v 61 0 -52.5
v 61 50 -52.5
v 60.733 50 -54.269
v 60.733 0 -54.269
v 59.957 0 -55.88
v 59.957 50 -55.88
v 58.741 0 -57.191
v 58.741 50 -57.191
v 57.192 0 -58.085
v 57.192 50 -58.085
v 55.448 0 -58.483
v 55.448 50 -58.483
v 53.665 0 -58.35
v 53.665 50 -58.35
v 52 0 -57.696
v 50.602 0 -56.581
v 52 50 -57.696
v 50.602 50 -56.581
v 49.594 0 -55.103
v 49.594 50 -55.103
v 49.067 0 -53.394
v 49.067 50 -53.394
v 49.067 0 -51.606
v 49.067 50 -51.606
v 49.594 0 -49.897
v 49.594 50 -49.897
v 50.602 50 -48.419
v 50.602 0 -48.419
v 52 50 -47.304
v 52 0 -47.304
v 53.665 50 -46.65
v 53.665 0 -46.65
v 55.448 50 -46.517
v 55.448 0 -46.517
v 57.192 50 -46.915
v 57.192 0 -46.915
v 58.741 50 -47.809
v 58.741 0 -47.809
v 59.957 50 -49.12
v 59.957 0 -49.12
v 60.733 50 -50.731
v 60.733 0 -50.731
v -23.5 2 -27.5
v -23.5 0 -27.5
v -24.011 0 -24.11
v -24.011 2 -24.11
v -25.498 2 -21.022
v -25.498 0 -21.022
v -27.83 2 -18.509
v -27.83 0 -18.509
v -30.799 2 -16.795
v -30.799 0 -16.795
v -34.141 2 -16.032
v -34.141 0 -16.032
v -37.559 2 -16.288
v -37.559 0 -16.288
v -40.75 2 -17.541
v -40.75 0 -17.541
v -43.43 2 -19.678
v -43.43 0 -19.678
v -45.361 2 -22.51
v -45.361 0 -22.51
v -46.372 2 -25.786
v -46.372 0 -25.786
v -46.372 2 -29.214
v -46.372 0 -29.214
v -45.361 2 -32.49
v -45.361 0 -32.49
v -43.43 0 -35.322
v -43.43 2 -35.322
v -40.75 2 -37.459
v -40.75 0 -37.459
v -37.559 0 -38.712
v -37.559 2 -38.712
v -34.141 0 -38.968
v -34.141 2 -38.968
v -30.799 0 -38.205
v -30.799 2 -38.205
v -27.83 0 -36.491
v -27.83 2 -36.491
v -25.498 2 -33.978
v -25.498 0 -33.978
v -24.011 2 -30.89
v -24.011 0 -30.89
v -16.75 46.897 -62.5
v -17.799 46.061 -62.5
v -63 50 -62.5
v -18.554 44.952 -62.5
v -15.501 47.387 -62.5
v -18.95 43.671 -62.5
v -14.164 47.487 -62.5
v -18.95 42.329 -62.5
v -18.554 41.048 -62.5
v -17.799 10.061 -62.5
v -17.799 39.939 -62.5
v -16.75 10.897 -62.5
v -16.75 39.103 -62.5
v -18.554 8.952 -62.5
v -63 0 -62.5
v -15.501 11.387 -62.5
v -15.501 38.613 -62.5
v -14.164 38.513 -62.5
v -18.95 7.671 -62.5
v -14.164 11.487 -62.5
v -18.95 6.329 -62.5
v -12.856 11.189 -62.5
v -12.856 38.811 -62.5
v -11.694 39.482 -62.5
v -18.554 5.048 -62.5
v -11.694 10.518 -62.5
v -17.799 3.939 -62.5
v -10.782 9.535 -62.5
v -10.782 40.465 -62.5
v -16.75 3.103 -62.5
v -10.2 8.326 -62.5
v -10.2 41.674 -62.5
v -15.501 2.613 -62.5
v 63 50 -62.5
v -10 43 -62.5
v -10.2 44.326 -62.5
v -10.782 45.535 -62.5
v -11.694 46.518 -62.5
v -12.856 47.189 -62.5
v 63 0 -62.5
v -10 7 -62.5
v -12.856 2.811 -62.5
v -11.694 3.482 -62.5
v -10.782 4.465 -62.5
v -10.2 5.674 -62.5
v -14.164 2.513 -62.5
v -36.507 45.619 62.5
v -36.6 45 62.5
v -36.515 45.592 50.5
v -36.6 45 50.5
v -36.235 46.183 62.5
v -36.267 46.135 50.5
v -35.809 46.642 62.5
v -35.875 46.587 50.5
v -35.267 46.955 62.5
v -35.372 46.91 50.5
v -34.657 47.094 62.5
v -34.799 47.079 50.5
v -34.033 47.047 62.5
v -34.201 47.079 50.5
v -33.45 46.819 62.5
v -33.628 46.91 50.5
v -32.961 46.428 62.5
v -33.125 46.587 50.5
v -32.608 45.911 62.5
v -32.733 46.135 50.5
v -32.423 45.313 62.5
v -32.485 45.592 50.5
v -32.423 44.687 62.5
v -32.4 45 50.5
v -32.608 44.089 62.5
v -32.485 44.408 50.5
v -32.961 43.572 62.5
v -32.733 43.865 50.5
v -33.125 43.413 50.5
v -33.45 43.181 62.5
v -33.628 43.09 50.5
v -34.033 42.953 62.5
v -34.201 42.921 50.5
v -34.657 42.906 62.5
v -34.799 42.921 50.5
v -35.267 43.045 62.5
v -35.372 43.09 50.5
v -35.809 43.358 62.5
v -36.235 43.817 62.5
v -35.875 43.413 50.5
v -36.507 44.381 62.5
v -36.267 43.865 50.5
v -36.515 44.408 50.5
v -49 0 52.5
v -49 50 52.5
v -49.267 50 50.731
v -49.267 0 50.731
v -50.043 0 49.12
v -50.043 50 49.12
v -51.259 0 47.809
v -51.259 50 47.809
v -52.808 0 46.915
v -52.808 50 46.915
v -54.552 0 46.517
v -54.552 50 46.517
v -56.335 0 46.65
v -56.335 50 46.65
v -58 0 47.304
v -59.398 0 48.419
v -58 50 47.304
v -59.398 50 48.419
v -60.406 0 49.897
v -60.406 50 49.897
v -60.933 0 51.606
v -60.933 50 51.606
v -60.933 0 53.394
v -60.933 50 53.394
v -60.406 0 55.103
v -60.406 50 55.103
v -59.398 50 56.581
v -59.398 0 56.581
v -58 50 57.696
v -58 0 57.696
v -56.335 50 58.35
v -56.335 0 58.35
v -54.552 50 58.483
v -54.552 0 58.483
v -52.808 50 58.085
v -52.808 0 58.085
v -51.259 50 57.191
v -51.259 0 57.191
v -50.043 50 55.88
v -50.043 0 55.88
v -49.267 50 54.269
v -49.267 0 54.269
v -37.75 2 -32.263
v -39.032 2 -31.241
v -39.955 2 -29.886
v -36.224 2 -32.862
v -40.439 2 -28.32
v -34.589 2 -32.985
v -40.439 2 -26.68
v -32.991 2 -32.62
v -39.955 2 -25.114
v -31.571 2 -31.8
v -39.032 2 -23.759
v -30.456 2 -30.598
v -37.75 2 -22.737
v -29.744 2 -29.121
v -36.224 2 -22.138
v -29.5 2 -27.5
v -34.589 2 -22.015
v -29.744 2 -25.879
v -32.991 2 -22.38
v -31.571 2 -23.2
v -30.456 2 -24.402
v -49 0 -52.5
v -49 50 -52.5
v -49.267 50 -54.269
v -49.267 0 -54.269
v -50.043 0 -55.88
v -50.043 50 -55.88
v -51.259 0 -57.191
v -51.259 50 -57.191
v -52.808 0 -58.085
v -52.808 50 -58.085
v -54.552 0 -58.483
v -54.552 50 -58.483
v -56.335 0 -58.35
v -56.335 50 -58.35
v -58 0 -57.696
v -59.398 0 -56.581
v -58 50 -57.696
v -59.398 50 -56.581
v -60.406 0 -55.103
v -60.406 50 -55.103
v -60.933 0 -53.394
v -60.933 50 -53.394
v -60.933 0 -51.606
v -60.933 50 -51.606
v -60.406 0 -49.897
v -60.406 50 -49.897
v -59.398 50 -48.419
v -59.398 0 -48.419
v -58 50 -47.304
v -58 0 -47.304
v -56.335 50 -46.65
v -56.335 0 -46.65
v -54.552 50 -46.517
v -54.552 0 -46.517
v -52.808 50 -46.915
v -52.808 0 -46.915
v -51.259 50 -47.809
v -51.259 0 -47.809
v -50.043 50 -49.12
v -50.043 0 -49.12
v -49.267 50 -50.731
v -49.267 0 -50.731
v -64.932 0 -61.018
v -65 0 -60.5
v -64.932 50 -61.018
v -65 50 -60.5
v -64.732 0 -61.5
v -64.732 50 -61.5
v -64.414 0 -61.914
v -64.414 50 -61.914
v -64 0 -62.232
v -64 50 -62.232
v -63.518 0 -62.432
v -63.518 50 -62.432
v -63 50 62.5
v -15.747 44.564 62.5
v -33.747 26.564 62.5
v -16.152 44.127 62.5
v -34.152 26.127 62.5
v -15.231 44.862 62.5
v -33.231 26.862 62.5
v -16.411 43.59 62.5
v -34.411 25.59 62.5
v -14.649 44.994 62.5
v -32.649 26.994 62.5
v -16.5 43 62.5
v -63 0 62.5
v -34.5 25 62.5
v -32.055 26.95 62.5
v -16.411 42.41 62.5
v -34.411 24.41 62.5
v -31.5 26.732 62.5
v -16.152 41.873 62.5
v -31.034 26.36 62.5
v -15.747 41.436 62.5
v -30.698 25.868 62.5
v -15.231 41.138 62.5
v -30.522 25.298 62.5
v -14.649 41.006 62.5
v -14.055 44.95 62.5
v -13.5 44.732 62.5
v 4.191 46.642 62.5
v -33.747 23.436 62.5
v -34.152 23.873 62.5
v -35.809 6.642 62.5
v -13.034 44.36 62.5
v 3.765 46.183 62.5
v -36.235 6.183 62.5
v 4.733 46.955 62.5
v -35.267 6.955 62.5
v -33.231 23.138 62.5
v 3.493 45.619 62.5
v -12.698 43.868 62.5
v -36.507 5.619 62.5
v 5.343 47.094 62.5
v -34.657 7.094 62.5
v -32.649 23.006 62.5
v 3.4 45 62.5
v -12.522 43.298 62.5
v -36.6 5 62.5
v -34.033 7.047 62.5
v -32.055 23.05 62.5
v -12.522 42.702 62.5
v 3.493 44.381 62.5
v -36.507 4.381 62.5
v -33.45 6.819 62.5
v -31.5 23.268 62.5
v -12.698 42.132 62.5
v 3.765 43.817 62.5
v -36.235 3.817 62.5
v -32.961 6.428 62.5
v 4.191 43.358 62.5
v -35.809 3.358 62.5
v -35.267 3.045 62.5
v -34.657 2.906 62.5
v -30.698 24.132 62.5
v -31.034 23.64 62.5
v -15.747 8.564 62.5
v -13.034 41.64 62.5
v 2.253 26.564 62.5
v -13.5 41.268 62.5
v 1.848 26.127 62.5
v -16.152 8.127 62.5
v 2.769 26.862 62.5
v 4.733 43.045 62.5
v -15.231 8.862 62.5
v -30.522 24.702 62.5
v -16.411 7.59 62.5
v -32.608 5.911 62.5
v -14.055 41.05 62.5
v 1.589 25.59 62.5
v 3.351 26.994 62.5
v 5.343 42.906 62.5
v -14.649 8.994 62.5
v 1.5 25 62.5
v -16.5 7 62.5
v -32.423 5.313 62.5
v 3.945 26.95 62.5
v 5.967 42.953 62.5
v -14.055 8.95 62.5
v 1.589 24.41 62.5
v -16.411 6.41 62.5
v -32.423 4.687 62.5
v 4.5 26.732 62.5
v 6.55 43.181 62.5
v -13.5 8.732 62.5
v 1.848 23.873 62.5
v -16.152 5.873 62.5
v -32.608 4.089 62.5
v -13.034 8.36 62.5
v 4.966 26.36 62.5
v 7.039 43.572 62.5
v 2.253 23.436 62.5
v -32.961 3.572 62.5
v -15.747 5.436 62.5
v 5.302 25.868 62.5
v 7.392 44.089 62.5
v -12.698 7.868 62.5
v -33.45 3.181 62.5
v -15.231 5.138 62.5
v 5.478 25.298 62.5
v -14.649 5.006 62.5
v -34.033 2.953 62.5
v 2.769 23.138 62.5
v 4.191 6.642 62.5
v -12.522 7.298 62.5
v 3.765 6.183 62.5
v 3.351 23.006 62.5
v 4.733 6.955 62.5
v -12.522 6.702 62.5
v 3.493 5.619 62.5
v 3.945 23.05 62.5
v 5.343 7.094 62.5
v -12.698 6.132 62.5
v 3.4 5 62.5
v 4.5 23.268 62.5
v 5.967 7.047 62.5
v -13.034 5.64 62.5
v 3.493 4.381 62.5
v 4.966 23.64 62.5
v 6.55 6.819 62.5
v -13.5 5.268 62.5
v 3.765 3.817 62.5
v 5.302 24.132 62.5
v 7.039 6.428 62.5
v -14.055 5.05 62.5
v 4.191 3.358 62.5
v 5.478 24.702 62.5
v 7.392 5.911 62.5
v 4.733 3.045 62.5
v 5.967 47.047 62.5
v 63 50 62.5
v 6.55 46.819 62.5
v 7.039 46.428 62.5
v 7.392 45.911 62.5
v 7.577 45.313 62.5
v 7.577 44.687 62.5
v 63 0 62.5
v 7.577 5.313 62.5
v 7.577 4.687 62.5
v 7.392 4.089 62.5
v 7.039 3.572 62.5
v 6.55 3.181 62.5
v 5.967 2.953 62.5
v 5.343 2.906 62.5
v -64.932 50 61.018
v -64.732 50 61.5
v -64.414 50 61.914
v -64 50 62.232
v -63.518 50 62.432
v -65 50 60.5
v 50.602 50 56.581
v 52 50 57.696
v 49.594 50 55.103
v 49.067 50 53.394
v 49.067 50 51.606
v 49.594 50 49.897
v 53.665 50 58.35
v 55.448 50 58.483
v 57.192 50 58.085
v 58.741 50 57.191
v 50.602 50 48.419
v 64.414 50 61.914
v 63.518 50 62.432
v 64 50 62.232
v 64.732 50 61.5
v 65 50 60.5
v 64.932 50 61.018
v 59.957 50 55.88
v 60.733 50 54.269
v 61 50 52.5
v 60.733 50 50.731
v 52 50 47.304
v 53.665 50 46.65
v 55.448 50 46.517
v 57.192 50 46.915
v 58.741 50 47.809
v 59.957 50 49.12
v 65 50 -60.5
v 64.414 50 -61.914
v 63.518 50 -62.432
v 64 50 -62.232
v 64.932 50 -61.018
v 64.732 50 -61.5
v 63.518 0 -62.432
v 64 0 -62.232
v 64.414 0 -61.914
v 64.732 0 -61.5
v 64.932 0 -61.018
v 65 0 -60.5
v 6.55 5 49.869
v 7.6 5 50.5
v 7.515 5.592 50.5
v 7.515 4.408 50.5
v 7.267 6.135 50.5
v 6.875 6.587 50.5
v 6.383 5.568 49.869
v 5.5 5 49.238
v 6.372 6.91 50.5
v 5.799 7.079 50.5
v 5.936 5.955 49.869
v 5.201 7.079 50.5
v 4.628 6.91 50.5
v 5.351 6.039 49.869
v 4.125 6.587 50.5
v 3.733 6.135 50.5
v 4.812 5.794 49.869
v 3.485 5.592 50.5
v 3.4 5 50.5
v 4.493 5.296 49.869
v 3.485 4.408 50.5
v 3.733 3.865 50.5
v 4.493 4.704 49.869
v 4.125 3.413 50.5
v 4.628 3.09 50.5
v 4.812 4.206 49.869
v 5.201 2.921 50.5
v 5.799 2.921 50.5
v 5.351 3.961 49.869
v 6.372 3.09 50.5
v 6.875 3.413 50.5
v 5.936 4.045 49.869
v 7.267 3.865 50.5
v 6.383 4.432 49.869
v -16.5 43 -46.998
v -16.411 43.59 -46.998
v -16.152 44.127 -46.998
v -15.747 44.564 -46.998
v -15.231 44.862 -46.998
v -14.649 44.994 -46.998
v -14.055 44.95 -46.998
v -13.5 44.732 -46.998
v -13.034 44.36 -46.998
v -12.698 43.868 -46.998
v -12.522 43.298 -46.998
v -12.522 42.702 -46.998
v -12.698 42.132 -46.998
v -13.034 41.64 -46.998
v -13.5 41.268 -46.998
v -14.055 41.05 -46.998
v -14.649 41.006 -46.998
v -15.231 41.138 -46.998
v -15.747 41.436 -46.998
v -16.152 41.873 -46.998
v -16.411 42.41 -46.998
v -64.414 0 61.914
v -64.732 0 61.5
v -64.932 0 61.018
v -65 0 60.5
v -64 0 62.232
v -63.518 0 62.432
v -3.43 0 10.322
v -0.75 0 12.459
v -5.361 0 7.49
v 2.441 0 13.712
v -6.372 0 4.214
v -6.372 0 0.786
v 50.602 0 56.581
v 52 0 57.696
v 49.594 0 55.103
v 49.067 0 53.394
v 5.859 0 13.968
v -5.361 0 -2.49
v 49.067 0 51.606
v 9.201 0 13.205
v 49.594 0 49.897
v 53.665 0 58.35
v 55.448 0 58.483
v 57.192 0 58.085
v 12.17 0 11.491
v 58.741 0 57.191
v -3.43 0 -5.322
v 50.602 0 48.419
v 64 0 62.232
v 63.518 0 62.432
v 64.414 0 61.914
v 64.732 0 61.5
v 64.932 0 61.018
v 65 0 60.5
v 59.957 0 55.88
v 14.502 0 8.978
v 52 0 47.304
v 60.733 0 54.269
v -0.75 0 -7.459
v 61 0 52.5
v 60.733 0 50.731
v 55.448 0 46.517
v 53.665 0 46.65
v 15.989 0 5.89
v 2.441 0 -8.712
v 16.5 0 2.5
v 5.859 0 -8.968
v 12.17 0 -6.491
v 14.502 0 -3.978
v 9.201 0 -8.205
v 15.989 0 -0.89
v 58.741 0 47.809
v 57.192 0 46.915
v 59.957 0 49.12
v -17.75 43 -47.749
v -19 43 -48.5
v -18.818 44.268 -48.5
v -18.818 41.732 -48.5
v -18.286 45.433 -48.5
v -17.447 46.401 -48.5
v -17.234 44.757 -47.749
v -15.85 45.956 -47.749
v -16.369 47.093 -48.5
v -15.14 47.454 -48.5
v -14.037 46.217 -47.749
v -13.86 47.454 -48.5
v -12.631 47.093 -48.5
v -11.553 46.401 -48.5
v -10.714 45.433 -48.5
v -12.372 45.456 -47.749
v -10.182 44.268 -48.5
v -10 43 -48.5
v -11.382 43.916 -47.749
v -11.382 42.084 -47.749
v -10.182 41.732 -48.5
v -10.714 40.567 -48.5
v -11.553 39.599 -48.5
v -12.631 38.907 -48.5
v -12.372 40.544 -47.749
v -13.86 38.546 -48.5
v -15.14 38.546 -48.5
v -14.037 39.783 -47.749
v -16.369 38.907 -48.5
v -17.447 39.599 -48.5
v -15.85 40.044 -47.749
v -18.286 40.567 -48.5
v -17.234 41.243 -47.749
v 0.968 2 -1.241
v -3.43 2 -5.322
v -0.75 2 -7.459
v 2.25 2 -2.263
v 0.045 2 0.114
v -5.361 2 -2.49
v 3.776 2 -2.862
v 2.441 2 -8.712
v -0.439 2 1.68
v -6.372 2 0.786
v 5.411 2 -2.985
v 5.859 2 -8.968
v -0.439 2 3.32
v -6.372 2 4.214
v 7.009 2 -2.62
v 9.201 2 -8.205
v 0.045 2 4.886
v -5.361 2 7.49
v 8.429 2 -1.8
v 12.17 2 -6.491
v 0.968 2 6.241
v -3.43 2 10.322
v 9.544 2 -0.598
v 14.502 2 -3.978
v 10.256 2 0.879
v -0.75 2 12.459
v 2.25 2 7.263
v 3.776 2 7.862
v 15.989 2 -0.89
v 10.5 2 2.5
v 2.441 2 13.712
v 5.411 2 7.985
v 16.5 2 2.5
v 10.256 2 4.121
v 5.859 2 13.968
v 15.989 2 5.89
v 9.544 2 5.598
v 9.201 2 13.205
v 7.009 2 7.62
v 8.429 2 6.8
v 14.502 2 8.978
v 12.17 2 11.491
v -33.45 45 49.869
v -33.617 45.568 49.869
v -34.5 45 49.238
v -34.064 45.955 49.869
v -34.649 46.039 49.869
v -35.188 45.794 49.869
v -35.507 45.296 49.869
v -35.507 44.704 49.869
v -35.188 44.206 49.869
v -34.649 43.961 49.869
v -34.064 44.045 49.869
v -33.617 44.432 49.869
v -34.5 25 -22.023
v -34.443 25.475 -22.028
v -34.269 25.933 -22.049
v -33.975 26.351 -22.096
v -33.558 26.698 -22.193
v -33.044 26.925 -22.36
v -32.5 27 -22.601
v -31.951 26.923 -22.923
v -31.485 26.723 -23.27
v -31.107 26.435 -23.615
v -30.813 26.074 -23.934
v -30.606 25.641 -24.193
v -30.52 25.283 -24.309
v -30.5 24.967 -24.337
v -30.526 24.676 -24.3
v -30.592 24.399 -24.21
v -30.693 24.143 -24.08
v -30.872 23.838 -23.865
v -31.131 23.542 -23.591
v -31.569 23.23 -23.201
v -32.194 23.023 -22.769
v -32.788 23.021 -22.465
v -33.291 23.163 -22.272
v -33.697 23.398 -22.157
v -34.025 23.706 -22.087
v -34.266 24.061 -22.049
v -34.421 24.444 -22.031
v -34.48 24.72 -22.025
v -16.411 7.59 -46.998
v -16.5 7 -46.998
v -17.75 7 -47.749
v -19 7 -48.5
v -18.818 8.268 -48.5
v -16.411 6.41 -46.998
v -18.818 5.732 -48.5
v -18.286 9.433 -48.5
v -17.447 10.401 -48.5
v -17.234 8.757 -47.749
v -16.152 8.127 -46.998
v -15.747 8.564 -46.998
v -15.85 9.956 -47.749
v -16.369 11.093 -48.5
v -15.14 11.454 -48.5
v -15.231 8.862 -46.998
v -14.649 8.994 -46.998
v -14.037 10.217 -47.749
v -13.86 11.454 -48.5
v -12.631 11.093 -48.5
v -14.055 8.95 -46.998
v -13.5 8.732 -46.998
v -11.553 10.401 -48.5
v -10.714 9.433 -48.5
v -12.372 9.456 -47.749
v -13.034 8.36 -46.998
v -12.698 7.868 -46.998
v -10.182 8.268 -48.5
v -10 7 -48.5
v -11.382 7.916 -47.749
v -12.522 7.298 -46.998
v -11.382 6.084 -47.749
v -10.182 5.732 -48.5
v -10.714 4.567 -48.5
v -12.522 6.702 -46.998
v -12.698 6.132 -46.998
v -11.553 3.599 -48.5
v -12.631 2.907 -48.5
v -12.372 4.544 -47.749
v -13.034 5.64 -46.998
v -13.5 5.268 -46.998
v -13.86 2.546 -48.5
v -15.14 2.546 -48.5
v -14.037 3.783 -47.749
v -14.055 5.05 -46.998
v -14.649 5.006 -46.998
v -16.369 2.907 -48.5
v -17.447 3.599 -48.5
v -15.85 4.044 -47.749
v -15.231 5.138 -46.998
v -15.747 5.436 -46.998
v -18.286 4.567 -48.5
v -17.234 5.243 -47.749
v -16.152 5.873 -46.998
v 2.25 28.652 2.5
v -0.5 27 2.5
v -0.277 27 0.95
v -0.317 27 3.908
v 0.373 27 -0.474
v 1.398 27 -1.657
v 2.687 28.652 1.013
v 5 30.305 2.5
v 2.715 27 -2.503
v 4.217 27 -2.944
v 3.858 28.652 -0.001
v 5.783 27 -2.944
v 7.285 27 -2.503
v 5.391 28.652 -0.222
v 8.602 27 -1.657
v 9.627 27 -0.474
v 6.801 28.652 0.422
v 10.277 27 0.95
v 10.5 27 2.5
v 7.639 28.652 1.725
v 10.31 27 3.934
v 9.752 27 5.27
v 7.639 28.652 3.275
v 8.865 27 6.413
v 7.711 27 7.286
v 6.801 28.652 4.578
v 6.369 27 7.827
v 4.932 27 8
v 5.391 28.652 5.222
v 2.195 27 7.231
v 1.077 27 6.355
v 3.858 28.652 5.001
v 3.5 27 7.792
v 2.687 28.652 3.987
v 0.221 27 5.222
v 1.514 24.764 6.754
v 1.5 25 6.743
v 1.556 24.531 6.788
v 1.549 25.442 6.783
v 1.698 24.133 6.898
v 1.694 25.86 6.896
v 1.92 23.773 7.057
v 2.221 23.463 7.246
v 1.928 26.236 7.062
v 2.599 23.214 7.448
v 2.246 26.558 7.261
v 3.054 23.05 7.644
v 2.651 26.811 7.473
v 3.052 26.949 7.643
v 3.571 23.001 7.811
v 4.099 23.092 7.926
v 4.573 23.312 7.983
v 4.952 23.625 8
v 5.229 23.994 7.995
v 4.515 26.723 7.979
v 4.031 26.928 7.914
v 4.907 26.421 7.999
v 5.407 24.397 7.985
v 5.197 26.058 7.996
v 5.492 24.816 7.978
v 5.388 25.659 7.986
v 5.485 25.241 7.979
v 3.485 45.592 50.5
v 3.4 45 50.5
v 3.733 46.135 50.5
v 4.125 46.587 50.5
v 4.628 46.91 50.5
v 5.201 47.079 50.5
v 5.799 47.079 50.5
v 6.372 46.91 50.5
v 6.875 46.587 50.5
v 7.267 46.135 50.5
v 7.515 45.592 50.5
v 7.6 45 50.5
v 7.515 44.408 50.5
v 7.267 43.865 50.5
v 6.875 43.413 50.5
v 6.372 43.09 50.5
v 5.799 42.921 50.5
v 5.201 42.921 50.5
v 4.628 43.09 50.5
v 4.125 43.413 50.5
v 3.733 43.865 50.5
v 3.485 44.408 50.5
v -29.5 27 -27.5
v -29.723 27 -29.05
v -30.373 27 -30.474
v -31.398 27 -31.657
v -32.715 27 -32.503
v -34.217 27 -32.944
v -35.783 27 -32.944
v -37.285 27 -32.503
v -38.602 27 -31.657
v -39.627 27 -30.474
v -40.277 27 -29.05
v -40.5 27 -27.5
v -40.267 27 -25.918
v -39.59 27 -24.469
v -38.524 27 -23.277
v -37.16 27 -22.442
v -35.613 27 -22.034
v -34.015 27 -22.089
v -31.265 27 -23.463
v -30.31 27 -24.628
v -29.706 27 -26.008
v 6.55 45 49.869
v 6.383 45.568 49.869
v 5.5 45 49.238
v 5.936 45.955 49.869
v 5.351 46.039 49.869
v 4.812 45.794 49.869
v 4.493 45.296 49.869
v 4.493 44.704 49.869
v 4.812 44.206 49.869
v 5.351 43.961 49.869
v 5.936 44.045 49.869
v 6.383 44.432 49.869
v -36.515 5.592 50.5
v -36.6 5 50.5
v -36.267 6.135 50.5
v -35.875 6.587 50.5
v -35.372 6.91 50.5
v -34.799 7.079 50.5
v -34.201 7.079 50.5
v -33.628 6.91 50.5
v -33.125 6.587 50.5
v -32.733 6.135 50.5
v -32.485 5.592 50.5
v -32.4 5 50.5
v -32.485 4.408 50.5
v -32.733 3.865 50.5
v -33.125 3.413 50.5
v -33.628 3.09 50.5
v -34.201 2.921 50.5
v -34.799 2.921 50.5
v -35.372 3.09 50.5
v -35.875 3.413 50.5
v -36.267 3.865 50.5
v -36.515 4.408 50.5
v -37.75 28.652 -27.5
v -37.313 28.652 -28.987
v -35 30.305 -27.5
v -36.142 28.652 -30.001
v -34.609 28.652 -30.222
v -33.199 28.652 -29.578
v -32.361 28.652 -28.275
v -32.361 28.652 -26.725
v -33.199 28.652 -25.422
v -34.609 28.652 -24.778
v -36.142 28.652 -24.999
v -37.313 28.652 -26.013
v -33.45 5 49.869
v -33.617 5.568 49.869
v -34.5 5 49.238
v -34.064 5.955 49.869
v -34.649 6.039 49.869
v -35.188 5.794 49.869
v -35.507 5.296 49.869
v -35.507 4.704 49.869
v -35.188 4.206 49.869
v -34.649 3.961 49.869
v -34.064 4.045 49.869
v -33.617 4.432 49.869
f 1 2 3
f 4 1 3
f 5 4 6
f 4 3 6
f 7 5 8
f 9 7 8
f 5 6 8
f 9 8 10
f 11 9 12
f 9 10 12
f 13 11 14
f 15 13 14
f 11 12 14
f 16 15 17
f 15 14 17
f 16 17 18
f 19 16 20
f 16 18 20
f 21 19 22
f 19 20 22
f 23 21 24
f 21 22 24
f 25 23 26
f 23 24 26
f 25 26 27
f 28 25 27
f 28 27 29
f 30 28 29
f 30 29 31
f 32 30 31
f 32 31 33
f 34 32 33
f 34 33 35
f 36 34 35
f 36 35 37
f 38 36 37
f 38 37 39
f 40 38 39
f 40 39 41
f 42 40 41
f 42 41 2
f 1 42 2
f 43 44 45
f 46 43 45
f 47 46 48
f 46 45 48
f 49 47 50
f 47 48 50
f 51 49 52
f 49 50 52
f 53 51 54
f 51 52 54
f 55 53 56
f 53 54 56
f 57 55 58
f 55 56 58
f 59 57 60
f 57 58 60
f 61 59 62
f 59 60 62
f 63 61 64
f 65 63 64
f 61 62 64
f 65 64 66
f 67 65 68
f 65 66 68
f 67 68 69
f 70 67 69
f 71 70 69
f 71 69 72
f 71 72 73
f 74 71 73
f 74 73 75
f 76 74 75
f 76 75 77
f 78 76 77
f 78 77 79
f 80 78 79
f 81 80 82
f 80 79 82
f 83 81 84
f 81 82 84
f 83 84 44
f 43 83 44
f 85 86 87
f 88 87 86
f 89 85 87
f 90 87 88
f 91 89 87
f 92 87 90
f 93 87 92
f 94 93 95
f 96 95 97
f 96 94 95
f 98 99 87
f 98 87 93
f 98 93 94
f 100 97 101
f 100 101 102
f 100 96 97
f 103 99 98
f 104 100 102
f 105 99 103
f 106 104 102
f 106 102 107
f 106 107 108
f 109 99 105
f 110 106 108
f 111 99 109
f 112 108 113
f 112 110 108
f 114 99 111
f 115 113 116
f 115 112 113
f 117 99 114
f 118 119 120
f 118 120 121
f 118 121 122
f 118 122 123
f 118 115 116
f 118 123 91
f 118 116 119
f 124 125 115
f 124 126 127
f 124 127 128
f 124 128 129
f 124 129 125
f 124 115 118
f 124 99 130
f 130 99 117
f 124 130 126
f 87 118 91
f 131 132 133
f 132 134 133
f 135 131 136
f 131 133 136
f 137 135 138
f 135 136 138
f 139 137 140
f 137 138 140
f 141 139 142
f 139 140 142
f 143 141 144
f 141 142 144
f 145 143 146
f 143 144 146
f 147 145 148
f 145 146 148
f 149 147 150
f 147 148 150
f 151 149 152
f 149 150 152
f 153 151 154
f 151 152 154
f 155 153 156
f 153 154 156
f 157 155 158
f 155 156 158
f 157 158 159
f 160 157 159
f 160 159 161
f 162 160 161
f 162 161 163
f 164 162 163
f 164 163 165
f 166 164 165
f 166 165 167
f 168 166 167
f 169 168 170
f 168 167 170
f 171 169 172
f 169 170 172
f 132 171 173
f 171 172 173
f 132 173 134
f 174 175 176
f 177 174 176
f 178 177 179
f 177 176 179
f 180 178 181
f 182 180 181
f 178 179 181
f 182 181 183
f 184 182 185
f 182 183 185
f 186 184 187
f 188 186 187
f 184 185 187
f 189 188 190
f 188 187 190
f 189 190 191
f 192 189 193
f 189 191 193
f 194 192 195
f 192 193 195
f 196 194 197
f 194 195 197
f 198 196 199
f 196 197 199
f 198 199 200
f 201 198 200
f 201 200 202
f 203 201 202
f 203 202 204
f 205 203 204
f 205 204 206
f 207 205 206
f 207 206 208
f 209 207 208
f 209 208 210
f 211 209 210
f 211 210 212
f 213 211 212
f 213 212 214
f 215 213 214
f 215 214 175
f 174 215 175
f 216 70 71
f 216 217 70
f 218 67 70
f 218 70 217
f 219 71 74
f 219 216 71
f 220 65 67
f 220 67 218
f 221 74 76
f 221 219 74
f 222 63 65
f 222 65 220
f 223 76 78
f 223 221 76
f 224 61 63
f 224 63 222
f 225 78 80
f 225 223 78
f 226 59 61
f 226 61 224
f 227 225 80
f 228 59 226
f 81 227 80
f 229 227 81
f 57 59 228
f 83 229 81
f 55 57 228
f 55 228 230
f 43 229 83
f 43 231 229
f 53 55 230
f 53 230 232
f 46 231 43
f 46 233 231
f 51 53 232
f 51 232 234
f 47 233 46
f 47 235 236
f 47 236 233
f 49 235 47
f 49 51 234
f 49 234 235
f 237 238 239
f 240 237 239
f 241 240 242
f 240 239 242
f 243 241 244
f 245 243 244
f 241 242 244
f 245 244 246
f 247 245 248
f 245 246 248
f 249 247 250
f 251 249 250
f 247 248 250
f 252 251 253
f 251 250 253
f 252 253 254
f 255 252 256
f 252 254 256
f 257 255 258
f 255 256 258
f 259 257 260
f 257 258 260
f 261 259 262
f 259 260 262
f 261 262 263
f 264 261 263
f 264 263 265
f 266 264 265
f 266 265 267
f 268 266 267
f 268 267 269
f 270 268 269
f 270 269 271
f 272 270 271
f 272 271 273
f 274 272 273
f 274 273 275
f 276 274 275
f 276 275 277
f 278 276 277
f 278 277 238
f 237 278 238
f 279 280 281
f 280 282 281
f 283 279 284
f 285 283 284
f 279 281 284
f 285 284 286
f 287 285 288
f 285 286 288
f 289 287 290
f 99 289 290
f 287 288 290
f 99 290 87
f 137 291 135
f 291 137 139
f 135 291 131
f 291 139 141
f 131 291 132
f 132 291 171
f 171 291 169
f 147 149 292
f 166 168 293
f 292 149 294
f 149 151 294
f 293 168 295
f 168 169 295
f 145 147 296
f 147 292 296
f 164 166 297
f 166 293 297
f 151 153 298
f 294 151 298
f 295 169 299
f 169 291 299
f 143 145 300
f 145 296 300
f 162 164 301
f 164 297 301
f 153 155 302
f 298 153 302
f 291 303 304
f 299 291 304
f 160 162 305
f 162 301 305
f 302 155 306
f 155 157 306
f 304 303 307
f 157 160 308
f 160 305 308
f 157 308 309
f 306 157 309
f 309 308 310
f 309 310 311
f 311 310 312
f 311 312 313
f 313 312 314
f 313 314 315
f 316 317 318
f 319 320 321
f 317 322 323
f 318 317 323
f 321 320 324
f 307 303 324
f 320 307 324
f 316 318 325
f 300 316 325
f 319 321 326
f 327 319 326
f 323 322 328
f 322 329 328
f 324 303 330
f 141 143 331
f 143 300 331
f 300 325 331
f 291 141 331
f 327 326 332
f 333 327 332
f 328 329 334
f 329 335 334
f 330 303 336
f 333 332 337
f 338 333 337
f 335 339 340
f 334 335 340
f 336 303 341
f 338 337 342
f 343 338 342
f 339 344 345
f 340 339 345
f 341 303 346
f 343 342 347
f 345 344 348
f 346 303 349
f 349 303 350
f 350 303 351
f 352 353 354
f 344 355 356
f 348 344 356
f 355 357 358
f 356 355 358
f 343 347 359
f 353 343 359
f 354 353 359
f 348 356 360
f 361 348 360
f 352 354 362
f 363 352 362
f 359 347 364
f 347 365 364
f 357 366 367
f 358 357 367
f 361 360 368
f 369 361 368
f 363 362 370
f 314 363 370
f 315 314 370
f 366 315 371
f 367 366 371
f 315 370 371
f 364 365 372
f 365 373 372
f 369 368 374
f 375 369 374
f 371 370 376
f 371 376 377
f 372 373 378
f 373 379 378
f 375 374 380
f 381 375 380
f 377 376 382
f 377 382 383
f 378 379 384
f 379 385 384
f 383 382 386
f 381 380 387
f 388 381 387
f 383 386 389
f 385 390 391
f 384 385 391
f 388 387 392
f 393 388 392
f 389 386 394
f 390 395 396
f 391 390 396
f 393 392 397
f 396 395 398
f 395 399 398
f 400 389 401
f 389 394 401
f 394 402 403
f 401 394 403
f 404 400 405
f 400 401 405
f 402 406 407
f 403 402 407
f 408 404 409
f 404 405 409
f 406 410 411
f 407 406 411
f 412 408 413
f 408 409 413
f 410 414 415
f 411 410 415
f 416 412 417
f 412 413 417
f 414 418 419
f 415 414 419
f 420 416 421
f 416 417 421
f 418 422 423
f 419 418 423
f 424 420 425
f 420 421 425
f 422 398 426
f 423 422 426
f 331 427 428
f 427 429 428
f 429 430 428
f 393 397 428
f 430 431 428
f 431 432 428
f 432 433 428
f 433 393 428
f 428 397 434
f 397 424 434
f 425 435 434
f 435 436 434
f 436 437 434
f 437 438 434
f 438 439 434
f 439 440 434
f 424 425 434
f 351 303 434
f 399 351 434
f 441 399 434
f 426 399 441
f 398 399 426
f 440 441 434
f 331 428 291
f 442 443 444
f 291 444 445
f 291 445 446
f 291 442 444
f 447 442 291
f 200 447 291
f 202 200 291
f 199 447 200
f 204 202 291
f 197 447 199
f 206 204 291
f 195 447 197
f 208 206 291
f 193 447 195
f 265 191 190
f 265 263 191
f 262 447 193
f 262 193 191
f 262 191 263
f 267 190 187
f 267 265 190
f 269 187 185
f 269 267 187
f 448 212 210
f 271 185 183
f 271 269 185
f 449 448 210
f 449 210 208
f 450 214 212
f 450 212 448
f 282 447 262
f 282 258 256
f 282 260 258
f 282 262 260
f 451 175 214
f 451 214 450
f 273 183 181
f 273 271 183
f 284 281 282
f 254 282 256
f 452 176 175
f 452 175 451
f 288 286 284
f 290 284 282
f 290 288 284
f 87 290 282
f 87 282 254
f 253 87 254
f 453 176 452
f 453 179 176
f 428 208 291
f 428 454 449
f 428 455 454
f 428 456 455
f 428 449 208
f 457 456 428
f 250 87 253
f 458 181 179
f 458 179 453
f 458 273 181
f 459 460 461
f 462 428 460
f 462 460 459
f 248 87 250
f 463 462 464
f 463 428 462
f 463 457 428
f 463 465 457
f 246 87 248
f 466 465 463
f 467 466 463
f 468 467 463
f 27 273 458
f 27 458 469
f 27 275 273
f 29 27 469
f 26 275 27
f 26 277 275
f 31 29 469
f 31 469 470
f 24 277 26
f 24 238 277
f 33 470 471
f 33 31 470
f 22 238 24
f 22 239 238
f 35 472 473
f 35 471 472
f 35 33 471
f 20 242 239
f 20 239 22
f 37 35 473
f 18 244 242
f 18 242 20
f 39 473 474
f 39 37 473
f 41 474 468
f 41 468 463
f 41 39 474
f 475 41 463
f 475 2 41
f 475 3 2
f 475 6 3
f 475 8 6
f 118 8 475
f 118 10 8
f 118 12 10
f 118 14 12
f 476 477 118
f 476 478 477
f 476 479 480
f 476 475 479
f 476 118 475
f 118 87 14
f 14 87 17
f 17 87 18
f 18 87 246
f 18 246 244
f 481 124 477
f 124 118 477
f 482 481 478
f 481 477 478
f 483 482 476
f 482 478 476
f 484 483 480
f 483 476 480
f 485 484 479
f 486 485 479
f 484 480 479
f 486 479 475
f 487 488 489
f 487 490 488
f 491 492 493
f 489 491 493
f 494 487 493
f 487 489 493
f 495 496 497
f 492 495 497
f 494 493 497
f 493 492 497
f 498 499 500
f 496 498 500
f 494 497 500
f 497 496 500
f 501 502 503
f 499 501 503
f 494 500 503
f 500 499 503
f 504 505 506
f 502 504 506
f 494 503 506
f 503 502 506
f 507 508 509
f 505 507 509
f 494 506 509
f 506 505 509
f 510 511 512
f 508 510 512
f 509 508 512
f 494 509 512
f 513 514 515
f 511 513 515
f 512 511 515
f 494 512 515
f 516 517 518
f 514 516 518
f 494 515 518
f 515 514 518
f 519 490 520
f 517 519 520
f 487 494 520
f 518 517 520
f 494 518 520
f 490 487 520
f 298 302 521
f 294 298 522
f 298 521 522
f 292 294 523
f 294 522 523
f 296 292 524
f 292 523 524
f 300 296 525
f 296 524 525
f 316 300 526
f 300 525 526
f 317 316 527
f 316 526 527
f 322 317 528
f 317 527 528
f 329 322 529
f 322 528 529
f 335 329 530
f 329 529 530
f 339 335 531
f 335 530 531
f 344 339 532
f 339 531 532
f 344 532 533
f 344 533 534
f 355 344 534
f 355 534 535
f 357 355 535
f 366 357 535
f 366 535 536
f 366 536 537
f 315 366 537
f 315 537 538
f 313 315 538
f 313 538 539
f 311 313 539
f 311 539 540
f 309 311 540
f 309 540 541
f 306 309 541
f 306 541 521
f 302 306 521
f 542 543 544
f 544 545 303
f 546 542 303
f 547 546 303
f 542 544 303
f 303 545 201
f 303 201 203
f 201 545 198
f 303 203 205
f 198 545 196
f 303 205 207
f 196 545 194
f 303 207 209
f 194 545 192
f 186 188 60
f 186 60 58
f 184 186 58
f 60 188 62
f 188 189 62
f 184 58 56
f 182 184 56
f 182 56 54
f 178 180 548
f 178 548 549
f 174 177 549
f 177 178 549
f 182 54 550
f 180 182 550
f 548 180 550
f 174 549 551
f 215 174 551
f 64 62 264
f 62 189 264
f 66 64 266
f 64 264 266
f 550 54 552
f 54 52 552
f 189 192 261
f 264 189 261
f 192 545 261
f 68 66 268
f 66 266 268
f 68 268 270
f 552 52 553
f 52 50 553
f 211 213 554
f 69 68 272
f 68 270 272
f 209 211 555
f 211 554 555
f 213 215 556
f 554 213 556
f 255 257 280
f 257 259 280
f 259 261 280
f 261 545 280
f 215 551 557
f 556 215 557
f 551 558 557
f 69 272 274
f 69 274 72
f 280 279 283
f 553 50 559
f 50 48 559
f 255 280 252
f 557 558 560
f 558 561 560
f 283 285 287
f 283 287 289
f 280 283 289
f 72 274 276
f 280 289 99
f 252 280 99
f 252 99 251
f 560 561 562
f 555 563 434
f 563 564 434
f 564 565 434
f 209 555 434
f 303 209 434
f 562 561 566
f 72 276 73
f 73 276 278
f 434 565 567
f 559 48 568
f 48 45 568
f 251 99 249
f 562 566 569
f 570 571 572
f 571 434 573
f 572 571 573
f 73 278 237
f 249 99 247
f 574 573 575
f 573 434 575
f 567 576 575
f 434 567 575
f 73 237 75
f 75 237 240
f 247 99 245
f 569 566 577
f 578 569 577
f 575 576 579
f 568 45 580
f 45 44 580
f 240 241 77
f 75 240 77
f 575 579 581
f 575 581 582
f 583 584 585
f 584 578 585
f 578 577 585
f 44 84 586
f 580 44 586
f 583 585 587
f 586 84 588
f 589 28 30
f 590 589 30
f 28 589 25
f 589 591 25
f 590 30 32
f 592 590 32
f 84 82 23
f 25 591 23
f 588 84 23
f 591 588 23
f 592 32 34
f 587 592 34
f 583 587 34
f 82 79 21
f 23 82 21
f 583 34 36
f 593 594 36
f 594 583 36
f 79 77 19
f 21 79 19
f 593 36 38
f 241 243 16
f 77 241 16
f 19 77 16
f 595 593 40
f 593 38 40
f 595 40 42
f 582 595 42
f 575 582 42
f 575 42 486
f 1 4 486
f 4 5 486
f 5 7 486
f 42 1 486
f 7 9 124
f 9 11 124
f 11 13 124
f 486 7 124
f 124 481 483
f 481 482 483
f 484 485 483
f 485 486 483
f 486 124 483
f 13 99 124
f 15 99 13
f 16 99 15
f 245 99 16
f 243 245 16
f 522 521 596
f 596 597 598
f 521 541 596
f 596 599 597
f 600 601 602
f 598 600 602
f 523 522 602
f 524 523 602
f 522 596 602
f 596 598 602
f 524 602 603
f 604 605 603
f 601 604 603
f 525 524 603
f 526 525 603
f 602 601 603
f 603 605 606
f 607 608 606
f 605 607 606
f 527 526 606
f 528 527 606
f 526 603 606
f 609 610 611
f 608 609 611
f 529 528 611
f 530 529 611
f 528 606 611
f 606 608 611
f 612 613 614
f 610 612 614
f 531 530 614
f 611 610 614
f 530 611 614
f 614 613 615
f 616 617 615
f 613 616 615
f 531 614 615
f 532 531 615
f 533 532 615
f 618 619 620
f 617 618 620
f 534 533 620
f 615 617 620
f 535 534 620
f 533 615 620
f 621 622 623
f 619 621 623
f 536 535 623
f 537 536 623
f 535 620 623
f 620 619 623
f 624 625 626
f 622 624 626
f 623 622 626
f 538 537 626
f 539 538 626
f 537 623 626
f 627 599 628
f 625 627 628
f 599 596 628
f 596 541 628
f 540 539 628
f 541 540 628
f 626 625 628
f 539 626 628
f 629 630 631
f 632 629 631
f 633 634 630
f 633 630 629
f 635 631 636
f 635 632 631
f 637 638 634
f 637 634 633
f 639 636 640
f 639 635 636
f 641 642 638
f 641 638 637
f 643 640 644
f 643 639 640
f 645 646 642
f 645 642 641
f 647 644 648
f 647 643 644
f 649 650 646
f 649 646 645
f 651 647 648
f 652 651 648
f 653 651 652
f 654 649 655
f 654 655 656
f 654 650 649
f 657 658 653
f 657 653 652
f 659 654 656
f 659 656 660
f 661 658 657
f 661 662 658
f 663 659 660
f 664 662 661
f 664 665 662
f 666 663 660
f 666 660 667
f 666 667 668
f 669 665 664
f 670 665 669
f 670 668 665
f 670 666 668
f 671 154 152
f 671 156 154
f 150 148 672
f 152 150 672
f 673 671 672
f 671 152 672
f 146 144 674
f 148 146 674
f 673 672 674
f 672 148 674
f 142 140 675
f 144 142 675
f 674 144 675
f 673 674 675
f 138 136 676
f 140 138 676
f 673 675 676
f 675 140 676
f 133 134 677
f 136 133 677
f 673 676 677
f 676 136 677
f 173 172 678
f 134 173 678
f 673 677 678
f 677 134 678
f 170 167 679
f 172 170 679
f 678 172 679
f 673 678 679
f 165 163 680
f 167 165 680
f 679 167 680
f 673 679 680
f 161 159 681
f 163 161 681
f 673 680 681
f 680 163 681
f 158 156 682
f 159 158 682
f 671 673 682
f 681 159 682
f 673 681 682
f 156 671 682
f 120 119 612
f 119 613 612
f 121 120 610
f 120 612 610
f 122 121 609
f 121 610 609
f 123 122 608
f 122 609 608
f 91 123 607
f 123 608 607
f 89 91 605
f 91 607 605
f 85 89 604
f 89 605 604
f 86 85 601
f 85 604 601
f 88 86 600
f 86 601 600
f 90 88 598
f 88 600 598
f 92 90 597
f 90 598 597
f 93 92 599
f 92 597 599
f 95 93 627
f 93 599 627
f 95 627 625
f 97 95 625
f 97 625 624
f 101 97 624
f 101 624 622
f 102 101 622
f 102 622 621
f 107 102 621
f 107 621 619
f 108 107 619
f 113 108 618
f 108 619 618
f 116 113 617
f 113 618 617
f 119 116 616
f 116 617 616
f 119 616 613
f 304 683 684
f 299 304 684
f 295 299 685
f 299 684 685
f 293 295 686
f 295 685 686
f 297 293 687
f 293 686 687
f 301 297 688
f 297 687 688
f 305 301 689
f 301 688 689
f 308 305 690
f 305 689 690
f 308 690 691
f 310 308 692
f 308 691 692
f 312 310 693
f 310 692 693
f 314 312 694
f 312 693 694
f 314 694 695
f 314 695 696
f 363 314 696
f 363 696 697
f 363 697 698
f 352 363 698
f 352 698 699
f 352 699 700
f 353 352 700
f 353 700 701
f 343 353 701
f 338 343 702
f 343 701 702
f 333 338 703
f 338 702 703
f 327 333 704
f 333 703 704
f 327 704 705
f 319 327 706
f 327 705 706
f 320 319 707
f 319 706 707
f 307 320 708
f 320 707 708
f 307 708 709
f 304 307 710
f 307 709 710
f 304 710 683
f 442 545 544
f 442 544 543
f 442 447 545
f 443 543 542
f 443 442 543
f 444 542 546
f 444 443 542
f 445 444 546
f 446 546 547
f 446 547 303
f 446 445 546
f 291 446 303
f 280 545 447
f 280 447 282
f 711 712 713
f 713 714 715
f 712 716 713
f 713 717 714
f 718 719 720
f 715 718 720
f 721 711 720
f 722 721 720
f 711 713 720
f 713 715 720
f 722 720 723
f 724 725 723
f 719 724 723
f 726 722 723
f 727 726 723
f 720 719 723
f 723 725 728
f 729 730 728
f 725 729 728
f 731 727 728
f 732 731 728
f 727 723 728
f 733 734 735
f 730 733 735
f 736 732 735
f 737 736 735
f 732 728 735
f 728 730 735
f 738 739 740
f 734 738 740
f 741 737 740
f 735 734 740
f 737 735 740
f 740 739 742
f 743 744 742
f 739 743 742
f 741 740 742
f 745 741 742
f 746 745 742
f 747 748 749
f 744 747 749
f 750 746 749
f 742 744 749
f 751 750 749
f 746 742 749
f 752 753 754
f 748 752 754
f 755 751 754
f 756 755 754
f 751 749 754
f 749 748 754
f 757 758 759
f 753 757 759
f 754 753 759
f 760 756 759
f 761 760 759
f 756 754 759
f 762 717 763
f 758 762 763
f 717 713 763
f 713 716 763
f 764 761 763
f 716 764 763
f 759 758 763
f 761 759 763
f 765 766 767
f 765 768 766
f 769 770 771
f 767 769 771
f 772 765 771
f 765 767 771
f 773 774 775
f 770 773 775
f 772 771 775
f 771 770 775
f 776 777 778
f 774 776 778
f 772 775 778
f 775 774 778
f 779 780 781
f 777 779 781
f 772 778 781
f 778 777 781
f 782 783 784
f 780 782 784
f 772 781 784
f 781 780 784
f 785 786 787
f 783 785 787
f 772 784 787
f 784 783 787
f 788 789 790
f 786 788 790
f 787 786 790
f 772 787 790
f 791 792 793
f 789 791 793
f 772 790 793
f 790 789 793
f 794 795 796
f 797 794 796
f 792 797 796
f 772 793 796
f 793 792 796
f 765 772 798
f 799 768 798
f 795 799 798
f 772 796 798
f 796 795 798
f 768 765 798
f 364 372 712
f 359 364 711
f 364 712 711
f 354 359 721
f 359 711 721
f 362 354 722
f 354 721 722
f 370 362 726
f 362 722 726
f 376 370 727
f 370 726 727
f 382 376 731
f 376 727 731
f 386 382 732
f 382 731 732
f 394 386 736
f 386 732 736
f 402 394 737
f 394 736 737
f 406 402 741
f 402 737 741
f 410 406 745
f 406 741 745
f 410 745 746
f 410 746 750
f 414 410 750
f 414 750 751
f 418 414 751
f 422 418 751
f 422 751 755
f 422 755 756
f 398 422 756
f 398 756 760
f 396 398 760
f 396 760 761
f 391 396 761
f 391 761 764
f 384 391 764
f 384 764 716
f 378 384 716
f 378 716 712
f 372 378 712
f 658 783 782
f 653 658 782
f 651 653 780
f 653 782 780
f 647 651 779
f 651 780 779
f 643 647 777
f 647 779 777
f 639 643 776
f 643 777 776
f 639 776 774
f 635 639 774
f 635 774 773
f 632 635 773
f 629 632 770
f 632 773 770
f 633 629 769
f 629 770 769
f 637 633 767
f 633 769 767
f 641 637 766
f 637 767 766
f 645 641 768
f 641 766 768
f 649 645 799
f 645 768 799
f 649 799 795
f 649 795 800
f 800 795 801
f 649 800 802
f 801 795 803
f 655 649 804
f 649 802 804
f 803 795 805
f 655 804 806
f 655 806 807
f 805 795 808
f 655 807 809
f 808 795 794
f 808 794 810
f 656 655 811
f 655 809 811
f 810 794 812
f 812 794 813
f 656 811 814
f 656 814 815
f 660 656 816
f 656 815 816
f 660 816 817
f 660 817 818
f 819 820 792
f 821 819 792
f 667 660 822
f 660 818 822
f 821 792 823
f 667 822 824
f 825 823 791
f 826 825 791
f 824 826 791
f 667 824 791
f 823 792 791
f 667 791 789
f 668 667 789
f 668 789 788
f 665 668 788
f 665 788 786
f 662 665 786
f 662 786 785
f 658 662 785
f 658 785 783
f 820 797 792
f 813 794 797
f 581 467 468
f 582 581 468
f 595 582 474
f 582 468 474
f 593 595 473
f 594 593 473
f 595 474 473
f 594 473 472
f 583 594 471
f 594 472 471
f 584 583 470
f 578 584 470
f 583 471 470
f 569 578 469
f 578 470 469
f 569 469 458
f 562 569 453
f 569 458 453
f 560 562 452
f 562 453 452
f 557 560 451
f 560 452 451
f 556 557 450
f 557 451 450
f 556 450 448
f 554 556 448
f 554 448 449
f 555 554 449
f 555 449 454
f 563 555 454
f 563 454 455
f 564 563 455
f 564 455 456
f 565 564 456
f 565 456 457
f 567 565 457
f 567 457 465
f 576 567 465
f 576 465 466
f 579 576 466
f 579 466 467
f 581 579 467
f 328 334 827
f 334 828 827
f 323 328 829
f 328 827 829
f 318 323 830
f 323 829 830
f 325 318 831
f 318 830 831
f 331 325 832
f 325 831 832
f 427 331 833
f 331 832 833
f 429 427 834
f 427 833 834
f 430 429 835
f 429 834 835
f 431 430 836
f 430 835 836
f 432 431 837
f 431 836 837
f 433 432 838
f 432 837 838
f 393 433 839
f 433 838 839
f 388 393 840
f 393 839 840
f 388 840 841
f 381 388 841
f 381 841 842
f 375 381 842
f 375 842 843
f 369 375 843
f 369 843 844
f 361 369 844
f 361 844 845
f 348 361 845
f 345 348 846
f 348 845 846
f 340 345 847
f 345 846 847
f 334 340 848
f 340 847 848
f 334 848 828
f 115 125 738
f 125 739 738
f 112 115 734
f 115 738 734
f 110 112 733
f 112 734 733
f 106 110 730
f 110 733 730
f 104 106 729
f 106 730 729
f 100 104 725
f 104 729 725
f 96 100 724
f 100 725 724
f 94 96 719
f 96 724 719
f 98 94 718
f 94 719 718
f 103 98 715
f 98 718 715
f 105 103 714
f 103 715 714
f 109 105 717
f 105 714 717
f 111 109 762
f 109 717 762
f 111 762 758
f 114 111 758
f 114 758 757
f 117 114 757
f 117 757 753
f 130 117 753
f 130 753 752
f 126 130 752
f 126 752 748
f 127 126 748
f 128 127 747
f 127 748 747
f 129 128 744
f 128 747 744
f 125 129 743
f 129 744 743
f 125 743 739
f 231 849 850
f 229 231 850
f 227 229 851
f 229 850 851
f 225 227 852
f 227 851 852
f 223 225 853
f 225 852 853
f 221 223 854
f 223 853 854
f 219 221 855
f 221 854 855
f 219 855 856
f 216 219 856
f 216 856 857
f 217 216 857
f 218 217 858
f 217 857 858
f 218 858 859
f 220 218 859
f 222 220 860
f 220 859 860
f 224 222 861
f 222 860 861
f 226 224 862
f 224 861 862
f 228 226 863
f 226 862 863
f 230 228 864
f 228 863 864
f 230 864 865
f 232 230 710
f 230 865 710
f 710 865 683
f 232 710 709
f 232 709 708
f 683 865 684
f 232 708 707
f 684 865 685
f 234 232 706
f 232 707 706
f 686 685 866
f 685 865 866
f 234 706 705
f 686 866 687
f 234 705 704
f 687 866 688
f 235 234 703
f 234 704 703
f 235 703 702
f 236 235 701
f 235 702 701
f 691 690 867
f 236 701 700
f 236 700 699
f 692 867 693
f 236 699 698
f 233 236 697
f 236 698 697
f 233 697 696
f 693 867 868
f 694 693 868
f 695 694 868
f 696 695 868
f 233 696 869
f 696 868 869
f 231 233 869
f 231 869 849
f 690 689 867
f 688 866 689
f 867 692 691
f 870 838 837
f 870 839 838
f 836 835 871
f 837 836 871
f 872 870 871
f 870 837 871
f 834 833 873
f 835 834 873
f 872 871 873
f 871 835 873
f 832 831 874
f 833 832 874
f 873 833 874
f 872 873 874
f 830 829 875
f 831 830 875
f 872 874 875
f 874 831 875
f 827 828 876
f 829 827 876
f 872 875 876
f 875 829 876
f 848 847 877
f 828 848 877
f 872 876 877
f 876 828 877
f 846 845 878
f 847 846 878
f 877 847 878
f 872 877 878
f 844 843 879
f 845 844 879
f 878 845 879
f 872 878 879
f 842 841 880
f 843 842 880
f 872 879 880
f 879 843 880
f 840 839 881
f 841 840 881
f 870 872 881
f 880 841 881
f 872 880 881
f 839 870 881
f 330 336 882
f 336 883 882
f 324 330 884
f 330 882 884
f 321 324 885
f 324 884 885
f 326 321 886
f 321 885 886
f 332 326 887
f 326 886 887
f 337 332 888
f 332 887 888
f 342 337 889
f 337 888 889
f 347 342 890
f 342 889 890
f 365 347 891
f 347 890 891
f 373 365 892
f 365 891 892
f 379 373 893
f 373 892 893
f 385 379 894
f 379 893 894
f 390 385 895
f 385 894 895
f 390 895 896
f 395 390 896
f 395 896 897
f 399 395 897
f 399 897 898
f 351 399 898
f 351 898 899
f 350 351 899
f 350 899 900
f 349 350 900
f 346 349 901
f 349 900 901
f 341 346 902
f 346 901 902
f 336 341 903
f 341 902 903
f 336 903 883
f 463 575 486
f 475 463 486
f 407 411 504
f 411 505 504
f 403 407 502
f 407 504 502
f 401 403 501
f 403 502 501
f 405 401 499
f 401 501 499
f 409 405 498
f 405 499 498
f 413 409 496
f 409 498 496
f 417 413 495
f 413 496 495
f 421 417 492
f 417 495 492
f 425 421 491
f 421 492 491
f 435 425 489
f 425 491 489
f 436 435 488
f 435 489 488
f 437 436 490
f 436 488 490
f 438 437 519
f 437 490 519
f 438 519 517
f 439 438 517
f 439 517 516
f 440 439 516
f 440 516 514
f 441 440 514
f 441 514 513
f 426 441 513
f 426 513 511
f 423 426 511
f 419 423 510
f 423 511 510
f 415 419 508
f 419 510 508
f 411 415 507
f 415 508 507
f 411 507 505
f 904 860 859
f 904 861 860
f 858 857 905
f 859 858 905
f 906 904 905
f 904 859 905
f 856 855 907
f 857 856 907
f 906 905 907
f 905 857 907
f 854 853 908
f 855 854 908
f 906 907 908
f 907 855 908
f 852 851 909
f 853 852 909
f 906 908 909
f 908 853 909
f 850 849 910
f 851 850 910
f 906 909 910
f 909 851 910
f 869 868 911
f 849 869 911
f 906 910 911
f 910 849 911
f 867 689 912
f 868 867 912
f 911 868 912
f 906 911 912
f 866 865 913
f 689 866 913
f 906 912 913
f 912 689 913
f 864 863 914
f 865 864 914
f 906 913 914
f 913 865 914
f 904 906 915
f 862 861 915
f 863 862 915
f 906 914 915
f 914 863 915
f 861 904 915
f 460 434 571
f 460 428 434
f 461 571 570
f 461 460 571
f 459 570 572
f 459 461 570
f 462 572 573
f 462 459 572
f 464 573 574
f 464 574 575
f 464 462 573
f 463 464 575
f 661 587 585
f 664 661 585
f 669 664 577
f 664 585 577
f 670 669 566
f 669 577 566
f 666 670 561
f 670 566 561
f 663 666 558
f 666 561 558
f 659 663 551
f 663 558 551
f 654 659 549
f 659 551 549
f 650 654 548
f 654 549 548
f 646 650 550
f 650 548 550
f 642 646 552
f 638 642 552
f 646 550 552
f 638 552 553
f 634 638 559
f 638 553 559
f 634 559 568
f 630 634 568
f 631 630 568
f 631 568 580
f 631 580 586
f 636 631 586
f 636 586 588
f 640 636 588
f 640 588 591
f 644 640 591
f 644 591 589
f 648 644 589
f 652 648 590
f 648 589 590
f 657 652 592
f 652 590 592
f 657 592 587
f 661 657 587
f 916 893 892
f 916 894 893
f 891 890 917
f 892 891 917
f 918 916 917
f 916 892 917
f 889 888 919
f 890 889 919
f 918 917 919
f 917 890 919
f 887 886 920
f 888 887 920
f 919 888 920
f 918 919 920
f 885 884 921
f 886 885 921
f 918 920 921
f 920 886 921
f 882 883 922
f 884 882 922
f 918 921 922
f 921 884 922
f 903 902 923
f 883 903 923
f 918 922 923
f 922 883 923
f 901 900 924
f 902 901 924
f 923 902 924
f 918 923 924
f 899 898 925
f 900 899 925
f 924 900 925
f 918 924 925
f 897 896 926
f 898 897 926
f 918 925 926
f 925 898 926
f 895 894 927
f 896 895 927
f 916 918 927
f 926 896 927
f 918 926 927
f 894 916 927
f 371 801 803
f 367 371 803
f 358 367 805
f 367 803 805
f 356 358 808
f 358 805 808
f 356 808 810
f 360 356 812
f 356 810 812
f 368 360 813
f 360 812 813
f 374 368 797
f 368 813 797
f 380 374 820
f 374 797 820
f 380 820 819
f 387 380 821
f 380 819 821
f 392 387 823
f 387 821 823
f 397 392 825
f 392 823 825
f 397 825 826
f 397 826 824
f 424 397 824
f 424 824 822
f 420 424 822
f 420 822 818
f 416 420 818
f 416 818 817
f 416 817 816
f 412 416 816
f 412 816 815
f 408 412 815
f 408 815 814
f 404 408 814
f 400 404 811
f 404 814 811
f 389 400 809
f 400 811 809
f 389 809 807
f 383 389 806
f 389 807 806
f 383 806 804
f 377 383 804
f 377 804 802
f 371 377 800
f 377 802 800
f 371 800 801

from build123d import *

# Parameters (mm, degrees)
SKETCH_1_W             = 130
SKETCH_1_H             = 125
EXTRUDE_1_DEPTH        = 50
SKETCH_2_R             = 6
CUT_EXTRUDE_1_DEPTH    = 51
FILLET_1_R             = 2
SKETCH_4_R             = 11.5
CUT_EXTRUDE_2_DEPTH    = 2
MM_4_D                 = 11
MM_4_DEPTH             = 25
MM_4_TIP               = 3.304733405
MM_4_2_D               = 11
MM_4_2_DEPTH           = 25
MM_4_2_TIP             = 3.304733405
HOLE_WIZARD_M5_1_D     = 4.2
HOLE_WIZARD_M5_1_DEPTH = 12
HOLE_WIZARD_M5_1_TIP   = 1.2618073
MM_3_D                 = 4
MM_3_DEPTH             = 56
MM_3_TIP               = 1.201721238
MM_4_3_D               = 4
MM_4_3_DEPTH           = 87
MM_4_3_TIP             = 1.201721238
MM_5_D                 = 4
M10X1_0_1_D            = 9
M10X1_0_1_DEPTH        = 14
M10X1_0_1_TIP          = 2.703872786


with BuildPart() as part:
    # 草图1 → 凸台-拉伸1 (new body)
    with BuildSketch(Plane(origin=(0, 0, 0), x_dir=(1, 0, 0), z_dir=(0, 1, 0))):
        Rectangle(SKETCH_1_W, SKETCH_1_H)
    extrude(amount=EXTRUDE_1_DEPTH)

    # 草图2 → 切除-拉伸1 (cut, through all)
    with BuildSketch(Plane(origin=(0, 50, 0), x_dir=(1, 0, 0), z_dir=(0, 1, 0))):
        with Locations((-55, 52.5)):
            Circle(SKETCH_2_R)
        with Locations((55, 52.5)):
            Circle(SKETCH_2_R)
        with Locations((55, -52.5)):
            Circle(SKETCH_2_R)
        with Locations((-55, -52.5)):
            Circle(SKETCH_2_R)
    extrude(amount=-CUT_EXTRUDE_1_DEPTH, mode=Mode.SUBTRACT)

    # 圆角1
    fillet_1_edges = [part.edges().sort_by_distance(p)[0] for p in [
        (65, 25, 62.5),
        (-65, 25, 62.5),
        (-65, 25, -62.5),
        (65, 25, -62.5),
    ]]
    fillet(fillet_1_edges, radius=FILLET_1_R)

    # 草图4 → 切除-拉伸2 (cut)
    with BuildSketch(Plane.XZ):
        with Locations((-35, -27.5)):
            Circle(SKETCH_4_R)
        with Locations((5, 2.5)):
            Circle(SKETCH_4_R)
    extrude(amount=-CUT_EXTRUDE_2_DEPTH, mode=Mode.SUBTRACT)

    # mm _4
    with Locations(Plane(origin=(0, 2, 0), x_dir=(-1, 0, 0), z_dir=(0, -1, 0))):
        with Locations((-5, -2.5)):
            Hole(MM_4_D / 2, depth=MM_4_DEPTH)
            with Locations((0, 0, -(MM_4_DEPTH + MM_4_TIP / 2))):  # 118° drill point
                Cone(0, MM_4_D / 2, MM_4_TIP, mode=Mode.SUBTRACT)

    # mm _4 2
    with Locations(Plane(origin=(0, 2, 0), x_dir=(-1, 0, 0), z_dir=(0, -1, 0))):
        with Locations((35, 27.5)):
            Hole(MM_4_2_D / 2, depth=MM_4_2_DEPTH)
            with Locations((0, 0, -(MM_4_2_DEPTH + MM_4_2_TIP / 2))):  # 118° drill point
                Cone(0, MM_4_2_D / 2, MM_4_2_TIP, mode=Mode.SUBTRACT)

    # M5 螺纹孔1
    with Locations(Plane.XY.offset(62.5)):
        with Locations((-34.5, 45), (5.5, 45), (5.5, 5), (-34.5, 5)):
            Hole(HOLE_WIZARD_M5_1_D / 2, depth=HOLE_WIZARD_M5_1_DEPTH)
            with Locations((0, 0, -(HOLE_WIZARD_M5_1_DEPTH + HOLE_WIZARD_M5_1_TIP / 2))):  # 118° drill point
                Cone(0, HOLE_WIZARD_M5_1_D / 2, HOLE_WIZARD_M5_1_TIP, mode=Mode.SUBTRACT)

    # 大小mm 暗销孔3
    with Locations(Plane.XY.offset(62.5)):
        with Locations((3.5, 25)):
            Hole(MM_3_D / 2, depth=MM_3_DEPTH)
            with Locations((0, 0, -(MM_3_DEPTH + MM_3_TIP / 2))):  # 118° drill point
                Cone(0, MM_3_D / 2, MM_3_TIP, mode=Mode.SUBTRACT)

    # mm _4 3
    with Locations(Plane.XY.offset(62.5)):
        with Locations((-32.5, 25)):
            Hole(MM_4_3_D / 2, depth=MM_4_3_DEPTH)
            with Locations((0, 0, -(MM_4_3_DEPTH + MM_4_3_TIP / 2))):  # 118° drill point
                Cone(0, MM_4_3_D / 2, MM_4_3_TIP, mode=Mode.SUBTRACT)

    # 大小mm 暗销孔5 (through all)
    with Locations(Plane.XY.offset(62.5)):
        with Locations((-14.5, 43), (-14.5, 7)):
            Hole(MM_5_D / 2)

    # M10x1.0 螺纹孔1
    with Locations(Plane(origin=(0, 0, -62.5), x_dir=(-1, 0, 0), z_dir=(0, 0, -1))):
        with Locations((14.5, 43), (14.5, 7)):
            Hole(M10X1_0_1_D / 2, depth=M10X1_0_1_DEPTH)
            with Locations((0, 0, -(M10X1_0_1_DEPTH + M10X1_0_1_TIP / 2))):  # 118° drill point
                Cone(0, M10X1_0_1_D / 2, M10X1_0_1_TIP, mode=Mode.SUBTRACT)


solid = part.part
